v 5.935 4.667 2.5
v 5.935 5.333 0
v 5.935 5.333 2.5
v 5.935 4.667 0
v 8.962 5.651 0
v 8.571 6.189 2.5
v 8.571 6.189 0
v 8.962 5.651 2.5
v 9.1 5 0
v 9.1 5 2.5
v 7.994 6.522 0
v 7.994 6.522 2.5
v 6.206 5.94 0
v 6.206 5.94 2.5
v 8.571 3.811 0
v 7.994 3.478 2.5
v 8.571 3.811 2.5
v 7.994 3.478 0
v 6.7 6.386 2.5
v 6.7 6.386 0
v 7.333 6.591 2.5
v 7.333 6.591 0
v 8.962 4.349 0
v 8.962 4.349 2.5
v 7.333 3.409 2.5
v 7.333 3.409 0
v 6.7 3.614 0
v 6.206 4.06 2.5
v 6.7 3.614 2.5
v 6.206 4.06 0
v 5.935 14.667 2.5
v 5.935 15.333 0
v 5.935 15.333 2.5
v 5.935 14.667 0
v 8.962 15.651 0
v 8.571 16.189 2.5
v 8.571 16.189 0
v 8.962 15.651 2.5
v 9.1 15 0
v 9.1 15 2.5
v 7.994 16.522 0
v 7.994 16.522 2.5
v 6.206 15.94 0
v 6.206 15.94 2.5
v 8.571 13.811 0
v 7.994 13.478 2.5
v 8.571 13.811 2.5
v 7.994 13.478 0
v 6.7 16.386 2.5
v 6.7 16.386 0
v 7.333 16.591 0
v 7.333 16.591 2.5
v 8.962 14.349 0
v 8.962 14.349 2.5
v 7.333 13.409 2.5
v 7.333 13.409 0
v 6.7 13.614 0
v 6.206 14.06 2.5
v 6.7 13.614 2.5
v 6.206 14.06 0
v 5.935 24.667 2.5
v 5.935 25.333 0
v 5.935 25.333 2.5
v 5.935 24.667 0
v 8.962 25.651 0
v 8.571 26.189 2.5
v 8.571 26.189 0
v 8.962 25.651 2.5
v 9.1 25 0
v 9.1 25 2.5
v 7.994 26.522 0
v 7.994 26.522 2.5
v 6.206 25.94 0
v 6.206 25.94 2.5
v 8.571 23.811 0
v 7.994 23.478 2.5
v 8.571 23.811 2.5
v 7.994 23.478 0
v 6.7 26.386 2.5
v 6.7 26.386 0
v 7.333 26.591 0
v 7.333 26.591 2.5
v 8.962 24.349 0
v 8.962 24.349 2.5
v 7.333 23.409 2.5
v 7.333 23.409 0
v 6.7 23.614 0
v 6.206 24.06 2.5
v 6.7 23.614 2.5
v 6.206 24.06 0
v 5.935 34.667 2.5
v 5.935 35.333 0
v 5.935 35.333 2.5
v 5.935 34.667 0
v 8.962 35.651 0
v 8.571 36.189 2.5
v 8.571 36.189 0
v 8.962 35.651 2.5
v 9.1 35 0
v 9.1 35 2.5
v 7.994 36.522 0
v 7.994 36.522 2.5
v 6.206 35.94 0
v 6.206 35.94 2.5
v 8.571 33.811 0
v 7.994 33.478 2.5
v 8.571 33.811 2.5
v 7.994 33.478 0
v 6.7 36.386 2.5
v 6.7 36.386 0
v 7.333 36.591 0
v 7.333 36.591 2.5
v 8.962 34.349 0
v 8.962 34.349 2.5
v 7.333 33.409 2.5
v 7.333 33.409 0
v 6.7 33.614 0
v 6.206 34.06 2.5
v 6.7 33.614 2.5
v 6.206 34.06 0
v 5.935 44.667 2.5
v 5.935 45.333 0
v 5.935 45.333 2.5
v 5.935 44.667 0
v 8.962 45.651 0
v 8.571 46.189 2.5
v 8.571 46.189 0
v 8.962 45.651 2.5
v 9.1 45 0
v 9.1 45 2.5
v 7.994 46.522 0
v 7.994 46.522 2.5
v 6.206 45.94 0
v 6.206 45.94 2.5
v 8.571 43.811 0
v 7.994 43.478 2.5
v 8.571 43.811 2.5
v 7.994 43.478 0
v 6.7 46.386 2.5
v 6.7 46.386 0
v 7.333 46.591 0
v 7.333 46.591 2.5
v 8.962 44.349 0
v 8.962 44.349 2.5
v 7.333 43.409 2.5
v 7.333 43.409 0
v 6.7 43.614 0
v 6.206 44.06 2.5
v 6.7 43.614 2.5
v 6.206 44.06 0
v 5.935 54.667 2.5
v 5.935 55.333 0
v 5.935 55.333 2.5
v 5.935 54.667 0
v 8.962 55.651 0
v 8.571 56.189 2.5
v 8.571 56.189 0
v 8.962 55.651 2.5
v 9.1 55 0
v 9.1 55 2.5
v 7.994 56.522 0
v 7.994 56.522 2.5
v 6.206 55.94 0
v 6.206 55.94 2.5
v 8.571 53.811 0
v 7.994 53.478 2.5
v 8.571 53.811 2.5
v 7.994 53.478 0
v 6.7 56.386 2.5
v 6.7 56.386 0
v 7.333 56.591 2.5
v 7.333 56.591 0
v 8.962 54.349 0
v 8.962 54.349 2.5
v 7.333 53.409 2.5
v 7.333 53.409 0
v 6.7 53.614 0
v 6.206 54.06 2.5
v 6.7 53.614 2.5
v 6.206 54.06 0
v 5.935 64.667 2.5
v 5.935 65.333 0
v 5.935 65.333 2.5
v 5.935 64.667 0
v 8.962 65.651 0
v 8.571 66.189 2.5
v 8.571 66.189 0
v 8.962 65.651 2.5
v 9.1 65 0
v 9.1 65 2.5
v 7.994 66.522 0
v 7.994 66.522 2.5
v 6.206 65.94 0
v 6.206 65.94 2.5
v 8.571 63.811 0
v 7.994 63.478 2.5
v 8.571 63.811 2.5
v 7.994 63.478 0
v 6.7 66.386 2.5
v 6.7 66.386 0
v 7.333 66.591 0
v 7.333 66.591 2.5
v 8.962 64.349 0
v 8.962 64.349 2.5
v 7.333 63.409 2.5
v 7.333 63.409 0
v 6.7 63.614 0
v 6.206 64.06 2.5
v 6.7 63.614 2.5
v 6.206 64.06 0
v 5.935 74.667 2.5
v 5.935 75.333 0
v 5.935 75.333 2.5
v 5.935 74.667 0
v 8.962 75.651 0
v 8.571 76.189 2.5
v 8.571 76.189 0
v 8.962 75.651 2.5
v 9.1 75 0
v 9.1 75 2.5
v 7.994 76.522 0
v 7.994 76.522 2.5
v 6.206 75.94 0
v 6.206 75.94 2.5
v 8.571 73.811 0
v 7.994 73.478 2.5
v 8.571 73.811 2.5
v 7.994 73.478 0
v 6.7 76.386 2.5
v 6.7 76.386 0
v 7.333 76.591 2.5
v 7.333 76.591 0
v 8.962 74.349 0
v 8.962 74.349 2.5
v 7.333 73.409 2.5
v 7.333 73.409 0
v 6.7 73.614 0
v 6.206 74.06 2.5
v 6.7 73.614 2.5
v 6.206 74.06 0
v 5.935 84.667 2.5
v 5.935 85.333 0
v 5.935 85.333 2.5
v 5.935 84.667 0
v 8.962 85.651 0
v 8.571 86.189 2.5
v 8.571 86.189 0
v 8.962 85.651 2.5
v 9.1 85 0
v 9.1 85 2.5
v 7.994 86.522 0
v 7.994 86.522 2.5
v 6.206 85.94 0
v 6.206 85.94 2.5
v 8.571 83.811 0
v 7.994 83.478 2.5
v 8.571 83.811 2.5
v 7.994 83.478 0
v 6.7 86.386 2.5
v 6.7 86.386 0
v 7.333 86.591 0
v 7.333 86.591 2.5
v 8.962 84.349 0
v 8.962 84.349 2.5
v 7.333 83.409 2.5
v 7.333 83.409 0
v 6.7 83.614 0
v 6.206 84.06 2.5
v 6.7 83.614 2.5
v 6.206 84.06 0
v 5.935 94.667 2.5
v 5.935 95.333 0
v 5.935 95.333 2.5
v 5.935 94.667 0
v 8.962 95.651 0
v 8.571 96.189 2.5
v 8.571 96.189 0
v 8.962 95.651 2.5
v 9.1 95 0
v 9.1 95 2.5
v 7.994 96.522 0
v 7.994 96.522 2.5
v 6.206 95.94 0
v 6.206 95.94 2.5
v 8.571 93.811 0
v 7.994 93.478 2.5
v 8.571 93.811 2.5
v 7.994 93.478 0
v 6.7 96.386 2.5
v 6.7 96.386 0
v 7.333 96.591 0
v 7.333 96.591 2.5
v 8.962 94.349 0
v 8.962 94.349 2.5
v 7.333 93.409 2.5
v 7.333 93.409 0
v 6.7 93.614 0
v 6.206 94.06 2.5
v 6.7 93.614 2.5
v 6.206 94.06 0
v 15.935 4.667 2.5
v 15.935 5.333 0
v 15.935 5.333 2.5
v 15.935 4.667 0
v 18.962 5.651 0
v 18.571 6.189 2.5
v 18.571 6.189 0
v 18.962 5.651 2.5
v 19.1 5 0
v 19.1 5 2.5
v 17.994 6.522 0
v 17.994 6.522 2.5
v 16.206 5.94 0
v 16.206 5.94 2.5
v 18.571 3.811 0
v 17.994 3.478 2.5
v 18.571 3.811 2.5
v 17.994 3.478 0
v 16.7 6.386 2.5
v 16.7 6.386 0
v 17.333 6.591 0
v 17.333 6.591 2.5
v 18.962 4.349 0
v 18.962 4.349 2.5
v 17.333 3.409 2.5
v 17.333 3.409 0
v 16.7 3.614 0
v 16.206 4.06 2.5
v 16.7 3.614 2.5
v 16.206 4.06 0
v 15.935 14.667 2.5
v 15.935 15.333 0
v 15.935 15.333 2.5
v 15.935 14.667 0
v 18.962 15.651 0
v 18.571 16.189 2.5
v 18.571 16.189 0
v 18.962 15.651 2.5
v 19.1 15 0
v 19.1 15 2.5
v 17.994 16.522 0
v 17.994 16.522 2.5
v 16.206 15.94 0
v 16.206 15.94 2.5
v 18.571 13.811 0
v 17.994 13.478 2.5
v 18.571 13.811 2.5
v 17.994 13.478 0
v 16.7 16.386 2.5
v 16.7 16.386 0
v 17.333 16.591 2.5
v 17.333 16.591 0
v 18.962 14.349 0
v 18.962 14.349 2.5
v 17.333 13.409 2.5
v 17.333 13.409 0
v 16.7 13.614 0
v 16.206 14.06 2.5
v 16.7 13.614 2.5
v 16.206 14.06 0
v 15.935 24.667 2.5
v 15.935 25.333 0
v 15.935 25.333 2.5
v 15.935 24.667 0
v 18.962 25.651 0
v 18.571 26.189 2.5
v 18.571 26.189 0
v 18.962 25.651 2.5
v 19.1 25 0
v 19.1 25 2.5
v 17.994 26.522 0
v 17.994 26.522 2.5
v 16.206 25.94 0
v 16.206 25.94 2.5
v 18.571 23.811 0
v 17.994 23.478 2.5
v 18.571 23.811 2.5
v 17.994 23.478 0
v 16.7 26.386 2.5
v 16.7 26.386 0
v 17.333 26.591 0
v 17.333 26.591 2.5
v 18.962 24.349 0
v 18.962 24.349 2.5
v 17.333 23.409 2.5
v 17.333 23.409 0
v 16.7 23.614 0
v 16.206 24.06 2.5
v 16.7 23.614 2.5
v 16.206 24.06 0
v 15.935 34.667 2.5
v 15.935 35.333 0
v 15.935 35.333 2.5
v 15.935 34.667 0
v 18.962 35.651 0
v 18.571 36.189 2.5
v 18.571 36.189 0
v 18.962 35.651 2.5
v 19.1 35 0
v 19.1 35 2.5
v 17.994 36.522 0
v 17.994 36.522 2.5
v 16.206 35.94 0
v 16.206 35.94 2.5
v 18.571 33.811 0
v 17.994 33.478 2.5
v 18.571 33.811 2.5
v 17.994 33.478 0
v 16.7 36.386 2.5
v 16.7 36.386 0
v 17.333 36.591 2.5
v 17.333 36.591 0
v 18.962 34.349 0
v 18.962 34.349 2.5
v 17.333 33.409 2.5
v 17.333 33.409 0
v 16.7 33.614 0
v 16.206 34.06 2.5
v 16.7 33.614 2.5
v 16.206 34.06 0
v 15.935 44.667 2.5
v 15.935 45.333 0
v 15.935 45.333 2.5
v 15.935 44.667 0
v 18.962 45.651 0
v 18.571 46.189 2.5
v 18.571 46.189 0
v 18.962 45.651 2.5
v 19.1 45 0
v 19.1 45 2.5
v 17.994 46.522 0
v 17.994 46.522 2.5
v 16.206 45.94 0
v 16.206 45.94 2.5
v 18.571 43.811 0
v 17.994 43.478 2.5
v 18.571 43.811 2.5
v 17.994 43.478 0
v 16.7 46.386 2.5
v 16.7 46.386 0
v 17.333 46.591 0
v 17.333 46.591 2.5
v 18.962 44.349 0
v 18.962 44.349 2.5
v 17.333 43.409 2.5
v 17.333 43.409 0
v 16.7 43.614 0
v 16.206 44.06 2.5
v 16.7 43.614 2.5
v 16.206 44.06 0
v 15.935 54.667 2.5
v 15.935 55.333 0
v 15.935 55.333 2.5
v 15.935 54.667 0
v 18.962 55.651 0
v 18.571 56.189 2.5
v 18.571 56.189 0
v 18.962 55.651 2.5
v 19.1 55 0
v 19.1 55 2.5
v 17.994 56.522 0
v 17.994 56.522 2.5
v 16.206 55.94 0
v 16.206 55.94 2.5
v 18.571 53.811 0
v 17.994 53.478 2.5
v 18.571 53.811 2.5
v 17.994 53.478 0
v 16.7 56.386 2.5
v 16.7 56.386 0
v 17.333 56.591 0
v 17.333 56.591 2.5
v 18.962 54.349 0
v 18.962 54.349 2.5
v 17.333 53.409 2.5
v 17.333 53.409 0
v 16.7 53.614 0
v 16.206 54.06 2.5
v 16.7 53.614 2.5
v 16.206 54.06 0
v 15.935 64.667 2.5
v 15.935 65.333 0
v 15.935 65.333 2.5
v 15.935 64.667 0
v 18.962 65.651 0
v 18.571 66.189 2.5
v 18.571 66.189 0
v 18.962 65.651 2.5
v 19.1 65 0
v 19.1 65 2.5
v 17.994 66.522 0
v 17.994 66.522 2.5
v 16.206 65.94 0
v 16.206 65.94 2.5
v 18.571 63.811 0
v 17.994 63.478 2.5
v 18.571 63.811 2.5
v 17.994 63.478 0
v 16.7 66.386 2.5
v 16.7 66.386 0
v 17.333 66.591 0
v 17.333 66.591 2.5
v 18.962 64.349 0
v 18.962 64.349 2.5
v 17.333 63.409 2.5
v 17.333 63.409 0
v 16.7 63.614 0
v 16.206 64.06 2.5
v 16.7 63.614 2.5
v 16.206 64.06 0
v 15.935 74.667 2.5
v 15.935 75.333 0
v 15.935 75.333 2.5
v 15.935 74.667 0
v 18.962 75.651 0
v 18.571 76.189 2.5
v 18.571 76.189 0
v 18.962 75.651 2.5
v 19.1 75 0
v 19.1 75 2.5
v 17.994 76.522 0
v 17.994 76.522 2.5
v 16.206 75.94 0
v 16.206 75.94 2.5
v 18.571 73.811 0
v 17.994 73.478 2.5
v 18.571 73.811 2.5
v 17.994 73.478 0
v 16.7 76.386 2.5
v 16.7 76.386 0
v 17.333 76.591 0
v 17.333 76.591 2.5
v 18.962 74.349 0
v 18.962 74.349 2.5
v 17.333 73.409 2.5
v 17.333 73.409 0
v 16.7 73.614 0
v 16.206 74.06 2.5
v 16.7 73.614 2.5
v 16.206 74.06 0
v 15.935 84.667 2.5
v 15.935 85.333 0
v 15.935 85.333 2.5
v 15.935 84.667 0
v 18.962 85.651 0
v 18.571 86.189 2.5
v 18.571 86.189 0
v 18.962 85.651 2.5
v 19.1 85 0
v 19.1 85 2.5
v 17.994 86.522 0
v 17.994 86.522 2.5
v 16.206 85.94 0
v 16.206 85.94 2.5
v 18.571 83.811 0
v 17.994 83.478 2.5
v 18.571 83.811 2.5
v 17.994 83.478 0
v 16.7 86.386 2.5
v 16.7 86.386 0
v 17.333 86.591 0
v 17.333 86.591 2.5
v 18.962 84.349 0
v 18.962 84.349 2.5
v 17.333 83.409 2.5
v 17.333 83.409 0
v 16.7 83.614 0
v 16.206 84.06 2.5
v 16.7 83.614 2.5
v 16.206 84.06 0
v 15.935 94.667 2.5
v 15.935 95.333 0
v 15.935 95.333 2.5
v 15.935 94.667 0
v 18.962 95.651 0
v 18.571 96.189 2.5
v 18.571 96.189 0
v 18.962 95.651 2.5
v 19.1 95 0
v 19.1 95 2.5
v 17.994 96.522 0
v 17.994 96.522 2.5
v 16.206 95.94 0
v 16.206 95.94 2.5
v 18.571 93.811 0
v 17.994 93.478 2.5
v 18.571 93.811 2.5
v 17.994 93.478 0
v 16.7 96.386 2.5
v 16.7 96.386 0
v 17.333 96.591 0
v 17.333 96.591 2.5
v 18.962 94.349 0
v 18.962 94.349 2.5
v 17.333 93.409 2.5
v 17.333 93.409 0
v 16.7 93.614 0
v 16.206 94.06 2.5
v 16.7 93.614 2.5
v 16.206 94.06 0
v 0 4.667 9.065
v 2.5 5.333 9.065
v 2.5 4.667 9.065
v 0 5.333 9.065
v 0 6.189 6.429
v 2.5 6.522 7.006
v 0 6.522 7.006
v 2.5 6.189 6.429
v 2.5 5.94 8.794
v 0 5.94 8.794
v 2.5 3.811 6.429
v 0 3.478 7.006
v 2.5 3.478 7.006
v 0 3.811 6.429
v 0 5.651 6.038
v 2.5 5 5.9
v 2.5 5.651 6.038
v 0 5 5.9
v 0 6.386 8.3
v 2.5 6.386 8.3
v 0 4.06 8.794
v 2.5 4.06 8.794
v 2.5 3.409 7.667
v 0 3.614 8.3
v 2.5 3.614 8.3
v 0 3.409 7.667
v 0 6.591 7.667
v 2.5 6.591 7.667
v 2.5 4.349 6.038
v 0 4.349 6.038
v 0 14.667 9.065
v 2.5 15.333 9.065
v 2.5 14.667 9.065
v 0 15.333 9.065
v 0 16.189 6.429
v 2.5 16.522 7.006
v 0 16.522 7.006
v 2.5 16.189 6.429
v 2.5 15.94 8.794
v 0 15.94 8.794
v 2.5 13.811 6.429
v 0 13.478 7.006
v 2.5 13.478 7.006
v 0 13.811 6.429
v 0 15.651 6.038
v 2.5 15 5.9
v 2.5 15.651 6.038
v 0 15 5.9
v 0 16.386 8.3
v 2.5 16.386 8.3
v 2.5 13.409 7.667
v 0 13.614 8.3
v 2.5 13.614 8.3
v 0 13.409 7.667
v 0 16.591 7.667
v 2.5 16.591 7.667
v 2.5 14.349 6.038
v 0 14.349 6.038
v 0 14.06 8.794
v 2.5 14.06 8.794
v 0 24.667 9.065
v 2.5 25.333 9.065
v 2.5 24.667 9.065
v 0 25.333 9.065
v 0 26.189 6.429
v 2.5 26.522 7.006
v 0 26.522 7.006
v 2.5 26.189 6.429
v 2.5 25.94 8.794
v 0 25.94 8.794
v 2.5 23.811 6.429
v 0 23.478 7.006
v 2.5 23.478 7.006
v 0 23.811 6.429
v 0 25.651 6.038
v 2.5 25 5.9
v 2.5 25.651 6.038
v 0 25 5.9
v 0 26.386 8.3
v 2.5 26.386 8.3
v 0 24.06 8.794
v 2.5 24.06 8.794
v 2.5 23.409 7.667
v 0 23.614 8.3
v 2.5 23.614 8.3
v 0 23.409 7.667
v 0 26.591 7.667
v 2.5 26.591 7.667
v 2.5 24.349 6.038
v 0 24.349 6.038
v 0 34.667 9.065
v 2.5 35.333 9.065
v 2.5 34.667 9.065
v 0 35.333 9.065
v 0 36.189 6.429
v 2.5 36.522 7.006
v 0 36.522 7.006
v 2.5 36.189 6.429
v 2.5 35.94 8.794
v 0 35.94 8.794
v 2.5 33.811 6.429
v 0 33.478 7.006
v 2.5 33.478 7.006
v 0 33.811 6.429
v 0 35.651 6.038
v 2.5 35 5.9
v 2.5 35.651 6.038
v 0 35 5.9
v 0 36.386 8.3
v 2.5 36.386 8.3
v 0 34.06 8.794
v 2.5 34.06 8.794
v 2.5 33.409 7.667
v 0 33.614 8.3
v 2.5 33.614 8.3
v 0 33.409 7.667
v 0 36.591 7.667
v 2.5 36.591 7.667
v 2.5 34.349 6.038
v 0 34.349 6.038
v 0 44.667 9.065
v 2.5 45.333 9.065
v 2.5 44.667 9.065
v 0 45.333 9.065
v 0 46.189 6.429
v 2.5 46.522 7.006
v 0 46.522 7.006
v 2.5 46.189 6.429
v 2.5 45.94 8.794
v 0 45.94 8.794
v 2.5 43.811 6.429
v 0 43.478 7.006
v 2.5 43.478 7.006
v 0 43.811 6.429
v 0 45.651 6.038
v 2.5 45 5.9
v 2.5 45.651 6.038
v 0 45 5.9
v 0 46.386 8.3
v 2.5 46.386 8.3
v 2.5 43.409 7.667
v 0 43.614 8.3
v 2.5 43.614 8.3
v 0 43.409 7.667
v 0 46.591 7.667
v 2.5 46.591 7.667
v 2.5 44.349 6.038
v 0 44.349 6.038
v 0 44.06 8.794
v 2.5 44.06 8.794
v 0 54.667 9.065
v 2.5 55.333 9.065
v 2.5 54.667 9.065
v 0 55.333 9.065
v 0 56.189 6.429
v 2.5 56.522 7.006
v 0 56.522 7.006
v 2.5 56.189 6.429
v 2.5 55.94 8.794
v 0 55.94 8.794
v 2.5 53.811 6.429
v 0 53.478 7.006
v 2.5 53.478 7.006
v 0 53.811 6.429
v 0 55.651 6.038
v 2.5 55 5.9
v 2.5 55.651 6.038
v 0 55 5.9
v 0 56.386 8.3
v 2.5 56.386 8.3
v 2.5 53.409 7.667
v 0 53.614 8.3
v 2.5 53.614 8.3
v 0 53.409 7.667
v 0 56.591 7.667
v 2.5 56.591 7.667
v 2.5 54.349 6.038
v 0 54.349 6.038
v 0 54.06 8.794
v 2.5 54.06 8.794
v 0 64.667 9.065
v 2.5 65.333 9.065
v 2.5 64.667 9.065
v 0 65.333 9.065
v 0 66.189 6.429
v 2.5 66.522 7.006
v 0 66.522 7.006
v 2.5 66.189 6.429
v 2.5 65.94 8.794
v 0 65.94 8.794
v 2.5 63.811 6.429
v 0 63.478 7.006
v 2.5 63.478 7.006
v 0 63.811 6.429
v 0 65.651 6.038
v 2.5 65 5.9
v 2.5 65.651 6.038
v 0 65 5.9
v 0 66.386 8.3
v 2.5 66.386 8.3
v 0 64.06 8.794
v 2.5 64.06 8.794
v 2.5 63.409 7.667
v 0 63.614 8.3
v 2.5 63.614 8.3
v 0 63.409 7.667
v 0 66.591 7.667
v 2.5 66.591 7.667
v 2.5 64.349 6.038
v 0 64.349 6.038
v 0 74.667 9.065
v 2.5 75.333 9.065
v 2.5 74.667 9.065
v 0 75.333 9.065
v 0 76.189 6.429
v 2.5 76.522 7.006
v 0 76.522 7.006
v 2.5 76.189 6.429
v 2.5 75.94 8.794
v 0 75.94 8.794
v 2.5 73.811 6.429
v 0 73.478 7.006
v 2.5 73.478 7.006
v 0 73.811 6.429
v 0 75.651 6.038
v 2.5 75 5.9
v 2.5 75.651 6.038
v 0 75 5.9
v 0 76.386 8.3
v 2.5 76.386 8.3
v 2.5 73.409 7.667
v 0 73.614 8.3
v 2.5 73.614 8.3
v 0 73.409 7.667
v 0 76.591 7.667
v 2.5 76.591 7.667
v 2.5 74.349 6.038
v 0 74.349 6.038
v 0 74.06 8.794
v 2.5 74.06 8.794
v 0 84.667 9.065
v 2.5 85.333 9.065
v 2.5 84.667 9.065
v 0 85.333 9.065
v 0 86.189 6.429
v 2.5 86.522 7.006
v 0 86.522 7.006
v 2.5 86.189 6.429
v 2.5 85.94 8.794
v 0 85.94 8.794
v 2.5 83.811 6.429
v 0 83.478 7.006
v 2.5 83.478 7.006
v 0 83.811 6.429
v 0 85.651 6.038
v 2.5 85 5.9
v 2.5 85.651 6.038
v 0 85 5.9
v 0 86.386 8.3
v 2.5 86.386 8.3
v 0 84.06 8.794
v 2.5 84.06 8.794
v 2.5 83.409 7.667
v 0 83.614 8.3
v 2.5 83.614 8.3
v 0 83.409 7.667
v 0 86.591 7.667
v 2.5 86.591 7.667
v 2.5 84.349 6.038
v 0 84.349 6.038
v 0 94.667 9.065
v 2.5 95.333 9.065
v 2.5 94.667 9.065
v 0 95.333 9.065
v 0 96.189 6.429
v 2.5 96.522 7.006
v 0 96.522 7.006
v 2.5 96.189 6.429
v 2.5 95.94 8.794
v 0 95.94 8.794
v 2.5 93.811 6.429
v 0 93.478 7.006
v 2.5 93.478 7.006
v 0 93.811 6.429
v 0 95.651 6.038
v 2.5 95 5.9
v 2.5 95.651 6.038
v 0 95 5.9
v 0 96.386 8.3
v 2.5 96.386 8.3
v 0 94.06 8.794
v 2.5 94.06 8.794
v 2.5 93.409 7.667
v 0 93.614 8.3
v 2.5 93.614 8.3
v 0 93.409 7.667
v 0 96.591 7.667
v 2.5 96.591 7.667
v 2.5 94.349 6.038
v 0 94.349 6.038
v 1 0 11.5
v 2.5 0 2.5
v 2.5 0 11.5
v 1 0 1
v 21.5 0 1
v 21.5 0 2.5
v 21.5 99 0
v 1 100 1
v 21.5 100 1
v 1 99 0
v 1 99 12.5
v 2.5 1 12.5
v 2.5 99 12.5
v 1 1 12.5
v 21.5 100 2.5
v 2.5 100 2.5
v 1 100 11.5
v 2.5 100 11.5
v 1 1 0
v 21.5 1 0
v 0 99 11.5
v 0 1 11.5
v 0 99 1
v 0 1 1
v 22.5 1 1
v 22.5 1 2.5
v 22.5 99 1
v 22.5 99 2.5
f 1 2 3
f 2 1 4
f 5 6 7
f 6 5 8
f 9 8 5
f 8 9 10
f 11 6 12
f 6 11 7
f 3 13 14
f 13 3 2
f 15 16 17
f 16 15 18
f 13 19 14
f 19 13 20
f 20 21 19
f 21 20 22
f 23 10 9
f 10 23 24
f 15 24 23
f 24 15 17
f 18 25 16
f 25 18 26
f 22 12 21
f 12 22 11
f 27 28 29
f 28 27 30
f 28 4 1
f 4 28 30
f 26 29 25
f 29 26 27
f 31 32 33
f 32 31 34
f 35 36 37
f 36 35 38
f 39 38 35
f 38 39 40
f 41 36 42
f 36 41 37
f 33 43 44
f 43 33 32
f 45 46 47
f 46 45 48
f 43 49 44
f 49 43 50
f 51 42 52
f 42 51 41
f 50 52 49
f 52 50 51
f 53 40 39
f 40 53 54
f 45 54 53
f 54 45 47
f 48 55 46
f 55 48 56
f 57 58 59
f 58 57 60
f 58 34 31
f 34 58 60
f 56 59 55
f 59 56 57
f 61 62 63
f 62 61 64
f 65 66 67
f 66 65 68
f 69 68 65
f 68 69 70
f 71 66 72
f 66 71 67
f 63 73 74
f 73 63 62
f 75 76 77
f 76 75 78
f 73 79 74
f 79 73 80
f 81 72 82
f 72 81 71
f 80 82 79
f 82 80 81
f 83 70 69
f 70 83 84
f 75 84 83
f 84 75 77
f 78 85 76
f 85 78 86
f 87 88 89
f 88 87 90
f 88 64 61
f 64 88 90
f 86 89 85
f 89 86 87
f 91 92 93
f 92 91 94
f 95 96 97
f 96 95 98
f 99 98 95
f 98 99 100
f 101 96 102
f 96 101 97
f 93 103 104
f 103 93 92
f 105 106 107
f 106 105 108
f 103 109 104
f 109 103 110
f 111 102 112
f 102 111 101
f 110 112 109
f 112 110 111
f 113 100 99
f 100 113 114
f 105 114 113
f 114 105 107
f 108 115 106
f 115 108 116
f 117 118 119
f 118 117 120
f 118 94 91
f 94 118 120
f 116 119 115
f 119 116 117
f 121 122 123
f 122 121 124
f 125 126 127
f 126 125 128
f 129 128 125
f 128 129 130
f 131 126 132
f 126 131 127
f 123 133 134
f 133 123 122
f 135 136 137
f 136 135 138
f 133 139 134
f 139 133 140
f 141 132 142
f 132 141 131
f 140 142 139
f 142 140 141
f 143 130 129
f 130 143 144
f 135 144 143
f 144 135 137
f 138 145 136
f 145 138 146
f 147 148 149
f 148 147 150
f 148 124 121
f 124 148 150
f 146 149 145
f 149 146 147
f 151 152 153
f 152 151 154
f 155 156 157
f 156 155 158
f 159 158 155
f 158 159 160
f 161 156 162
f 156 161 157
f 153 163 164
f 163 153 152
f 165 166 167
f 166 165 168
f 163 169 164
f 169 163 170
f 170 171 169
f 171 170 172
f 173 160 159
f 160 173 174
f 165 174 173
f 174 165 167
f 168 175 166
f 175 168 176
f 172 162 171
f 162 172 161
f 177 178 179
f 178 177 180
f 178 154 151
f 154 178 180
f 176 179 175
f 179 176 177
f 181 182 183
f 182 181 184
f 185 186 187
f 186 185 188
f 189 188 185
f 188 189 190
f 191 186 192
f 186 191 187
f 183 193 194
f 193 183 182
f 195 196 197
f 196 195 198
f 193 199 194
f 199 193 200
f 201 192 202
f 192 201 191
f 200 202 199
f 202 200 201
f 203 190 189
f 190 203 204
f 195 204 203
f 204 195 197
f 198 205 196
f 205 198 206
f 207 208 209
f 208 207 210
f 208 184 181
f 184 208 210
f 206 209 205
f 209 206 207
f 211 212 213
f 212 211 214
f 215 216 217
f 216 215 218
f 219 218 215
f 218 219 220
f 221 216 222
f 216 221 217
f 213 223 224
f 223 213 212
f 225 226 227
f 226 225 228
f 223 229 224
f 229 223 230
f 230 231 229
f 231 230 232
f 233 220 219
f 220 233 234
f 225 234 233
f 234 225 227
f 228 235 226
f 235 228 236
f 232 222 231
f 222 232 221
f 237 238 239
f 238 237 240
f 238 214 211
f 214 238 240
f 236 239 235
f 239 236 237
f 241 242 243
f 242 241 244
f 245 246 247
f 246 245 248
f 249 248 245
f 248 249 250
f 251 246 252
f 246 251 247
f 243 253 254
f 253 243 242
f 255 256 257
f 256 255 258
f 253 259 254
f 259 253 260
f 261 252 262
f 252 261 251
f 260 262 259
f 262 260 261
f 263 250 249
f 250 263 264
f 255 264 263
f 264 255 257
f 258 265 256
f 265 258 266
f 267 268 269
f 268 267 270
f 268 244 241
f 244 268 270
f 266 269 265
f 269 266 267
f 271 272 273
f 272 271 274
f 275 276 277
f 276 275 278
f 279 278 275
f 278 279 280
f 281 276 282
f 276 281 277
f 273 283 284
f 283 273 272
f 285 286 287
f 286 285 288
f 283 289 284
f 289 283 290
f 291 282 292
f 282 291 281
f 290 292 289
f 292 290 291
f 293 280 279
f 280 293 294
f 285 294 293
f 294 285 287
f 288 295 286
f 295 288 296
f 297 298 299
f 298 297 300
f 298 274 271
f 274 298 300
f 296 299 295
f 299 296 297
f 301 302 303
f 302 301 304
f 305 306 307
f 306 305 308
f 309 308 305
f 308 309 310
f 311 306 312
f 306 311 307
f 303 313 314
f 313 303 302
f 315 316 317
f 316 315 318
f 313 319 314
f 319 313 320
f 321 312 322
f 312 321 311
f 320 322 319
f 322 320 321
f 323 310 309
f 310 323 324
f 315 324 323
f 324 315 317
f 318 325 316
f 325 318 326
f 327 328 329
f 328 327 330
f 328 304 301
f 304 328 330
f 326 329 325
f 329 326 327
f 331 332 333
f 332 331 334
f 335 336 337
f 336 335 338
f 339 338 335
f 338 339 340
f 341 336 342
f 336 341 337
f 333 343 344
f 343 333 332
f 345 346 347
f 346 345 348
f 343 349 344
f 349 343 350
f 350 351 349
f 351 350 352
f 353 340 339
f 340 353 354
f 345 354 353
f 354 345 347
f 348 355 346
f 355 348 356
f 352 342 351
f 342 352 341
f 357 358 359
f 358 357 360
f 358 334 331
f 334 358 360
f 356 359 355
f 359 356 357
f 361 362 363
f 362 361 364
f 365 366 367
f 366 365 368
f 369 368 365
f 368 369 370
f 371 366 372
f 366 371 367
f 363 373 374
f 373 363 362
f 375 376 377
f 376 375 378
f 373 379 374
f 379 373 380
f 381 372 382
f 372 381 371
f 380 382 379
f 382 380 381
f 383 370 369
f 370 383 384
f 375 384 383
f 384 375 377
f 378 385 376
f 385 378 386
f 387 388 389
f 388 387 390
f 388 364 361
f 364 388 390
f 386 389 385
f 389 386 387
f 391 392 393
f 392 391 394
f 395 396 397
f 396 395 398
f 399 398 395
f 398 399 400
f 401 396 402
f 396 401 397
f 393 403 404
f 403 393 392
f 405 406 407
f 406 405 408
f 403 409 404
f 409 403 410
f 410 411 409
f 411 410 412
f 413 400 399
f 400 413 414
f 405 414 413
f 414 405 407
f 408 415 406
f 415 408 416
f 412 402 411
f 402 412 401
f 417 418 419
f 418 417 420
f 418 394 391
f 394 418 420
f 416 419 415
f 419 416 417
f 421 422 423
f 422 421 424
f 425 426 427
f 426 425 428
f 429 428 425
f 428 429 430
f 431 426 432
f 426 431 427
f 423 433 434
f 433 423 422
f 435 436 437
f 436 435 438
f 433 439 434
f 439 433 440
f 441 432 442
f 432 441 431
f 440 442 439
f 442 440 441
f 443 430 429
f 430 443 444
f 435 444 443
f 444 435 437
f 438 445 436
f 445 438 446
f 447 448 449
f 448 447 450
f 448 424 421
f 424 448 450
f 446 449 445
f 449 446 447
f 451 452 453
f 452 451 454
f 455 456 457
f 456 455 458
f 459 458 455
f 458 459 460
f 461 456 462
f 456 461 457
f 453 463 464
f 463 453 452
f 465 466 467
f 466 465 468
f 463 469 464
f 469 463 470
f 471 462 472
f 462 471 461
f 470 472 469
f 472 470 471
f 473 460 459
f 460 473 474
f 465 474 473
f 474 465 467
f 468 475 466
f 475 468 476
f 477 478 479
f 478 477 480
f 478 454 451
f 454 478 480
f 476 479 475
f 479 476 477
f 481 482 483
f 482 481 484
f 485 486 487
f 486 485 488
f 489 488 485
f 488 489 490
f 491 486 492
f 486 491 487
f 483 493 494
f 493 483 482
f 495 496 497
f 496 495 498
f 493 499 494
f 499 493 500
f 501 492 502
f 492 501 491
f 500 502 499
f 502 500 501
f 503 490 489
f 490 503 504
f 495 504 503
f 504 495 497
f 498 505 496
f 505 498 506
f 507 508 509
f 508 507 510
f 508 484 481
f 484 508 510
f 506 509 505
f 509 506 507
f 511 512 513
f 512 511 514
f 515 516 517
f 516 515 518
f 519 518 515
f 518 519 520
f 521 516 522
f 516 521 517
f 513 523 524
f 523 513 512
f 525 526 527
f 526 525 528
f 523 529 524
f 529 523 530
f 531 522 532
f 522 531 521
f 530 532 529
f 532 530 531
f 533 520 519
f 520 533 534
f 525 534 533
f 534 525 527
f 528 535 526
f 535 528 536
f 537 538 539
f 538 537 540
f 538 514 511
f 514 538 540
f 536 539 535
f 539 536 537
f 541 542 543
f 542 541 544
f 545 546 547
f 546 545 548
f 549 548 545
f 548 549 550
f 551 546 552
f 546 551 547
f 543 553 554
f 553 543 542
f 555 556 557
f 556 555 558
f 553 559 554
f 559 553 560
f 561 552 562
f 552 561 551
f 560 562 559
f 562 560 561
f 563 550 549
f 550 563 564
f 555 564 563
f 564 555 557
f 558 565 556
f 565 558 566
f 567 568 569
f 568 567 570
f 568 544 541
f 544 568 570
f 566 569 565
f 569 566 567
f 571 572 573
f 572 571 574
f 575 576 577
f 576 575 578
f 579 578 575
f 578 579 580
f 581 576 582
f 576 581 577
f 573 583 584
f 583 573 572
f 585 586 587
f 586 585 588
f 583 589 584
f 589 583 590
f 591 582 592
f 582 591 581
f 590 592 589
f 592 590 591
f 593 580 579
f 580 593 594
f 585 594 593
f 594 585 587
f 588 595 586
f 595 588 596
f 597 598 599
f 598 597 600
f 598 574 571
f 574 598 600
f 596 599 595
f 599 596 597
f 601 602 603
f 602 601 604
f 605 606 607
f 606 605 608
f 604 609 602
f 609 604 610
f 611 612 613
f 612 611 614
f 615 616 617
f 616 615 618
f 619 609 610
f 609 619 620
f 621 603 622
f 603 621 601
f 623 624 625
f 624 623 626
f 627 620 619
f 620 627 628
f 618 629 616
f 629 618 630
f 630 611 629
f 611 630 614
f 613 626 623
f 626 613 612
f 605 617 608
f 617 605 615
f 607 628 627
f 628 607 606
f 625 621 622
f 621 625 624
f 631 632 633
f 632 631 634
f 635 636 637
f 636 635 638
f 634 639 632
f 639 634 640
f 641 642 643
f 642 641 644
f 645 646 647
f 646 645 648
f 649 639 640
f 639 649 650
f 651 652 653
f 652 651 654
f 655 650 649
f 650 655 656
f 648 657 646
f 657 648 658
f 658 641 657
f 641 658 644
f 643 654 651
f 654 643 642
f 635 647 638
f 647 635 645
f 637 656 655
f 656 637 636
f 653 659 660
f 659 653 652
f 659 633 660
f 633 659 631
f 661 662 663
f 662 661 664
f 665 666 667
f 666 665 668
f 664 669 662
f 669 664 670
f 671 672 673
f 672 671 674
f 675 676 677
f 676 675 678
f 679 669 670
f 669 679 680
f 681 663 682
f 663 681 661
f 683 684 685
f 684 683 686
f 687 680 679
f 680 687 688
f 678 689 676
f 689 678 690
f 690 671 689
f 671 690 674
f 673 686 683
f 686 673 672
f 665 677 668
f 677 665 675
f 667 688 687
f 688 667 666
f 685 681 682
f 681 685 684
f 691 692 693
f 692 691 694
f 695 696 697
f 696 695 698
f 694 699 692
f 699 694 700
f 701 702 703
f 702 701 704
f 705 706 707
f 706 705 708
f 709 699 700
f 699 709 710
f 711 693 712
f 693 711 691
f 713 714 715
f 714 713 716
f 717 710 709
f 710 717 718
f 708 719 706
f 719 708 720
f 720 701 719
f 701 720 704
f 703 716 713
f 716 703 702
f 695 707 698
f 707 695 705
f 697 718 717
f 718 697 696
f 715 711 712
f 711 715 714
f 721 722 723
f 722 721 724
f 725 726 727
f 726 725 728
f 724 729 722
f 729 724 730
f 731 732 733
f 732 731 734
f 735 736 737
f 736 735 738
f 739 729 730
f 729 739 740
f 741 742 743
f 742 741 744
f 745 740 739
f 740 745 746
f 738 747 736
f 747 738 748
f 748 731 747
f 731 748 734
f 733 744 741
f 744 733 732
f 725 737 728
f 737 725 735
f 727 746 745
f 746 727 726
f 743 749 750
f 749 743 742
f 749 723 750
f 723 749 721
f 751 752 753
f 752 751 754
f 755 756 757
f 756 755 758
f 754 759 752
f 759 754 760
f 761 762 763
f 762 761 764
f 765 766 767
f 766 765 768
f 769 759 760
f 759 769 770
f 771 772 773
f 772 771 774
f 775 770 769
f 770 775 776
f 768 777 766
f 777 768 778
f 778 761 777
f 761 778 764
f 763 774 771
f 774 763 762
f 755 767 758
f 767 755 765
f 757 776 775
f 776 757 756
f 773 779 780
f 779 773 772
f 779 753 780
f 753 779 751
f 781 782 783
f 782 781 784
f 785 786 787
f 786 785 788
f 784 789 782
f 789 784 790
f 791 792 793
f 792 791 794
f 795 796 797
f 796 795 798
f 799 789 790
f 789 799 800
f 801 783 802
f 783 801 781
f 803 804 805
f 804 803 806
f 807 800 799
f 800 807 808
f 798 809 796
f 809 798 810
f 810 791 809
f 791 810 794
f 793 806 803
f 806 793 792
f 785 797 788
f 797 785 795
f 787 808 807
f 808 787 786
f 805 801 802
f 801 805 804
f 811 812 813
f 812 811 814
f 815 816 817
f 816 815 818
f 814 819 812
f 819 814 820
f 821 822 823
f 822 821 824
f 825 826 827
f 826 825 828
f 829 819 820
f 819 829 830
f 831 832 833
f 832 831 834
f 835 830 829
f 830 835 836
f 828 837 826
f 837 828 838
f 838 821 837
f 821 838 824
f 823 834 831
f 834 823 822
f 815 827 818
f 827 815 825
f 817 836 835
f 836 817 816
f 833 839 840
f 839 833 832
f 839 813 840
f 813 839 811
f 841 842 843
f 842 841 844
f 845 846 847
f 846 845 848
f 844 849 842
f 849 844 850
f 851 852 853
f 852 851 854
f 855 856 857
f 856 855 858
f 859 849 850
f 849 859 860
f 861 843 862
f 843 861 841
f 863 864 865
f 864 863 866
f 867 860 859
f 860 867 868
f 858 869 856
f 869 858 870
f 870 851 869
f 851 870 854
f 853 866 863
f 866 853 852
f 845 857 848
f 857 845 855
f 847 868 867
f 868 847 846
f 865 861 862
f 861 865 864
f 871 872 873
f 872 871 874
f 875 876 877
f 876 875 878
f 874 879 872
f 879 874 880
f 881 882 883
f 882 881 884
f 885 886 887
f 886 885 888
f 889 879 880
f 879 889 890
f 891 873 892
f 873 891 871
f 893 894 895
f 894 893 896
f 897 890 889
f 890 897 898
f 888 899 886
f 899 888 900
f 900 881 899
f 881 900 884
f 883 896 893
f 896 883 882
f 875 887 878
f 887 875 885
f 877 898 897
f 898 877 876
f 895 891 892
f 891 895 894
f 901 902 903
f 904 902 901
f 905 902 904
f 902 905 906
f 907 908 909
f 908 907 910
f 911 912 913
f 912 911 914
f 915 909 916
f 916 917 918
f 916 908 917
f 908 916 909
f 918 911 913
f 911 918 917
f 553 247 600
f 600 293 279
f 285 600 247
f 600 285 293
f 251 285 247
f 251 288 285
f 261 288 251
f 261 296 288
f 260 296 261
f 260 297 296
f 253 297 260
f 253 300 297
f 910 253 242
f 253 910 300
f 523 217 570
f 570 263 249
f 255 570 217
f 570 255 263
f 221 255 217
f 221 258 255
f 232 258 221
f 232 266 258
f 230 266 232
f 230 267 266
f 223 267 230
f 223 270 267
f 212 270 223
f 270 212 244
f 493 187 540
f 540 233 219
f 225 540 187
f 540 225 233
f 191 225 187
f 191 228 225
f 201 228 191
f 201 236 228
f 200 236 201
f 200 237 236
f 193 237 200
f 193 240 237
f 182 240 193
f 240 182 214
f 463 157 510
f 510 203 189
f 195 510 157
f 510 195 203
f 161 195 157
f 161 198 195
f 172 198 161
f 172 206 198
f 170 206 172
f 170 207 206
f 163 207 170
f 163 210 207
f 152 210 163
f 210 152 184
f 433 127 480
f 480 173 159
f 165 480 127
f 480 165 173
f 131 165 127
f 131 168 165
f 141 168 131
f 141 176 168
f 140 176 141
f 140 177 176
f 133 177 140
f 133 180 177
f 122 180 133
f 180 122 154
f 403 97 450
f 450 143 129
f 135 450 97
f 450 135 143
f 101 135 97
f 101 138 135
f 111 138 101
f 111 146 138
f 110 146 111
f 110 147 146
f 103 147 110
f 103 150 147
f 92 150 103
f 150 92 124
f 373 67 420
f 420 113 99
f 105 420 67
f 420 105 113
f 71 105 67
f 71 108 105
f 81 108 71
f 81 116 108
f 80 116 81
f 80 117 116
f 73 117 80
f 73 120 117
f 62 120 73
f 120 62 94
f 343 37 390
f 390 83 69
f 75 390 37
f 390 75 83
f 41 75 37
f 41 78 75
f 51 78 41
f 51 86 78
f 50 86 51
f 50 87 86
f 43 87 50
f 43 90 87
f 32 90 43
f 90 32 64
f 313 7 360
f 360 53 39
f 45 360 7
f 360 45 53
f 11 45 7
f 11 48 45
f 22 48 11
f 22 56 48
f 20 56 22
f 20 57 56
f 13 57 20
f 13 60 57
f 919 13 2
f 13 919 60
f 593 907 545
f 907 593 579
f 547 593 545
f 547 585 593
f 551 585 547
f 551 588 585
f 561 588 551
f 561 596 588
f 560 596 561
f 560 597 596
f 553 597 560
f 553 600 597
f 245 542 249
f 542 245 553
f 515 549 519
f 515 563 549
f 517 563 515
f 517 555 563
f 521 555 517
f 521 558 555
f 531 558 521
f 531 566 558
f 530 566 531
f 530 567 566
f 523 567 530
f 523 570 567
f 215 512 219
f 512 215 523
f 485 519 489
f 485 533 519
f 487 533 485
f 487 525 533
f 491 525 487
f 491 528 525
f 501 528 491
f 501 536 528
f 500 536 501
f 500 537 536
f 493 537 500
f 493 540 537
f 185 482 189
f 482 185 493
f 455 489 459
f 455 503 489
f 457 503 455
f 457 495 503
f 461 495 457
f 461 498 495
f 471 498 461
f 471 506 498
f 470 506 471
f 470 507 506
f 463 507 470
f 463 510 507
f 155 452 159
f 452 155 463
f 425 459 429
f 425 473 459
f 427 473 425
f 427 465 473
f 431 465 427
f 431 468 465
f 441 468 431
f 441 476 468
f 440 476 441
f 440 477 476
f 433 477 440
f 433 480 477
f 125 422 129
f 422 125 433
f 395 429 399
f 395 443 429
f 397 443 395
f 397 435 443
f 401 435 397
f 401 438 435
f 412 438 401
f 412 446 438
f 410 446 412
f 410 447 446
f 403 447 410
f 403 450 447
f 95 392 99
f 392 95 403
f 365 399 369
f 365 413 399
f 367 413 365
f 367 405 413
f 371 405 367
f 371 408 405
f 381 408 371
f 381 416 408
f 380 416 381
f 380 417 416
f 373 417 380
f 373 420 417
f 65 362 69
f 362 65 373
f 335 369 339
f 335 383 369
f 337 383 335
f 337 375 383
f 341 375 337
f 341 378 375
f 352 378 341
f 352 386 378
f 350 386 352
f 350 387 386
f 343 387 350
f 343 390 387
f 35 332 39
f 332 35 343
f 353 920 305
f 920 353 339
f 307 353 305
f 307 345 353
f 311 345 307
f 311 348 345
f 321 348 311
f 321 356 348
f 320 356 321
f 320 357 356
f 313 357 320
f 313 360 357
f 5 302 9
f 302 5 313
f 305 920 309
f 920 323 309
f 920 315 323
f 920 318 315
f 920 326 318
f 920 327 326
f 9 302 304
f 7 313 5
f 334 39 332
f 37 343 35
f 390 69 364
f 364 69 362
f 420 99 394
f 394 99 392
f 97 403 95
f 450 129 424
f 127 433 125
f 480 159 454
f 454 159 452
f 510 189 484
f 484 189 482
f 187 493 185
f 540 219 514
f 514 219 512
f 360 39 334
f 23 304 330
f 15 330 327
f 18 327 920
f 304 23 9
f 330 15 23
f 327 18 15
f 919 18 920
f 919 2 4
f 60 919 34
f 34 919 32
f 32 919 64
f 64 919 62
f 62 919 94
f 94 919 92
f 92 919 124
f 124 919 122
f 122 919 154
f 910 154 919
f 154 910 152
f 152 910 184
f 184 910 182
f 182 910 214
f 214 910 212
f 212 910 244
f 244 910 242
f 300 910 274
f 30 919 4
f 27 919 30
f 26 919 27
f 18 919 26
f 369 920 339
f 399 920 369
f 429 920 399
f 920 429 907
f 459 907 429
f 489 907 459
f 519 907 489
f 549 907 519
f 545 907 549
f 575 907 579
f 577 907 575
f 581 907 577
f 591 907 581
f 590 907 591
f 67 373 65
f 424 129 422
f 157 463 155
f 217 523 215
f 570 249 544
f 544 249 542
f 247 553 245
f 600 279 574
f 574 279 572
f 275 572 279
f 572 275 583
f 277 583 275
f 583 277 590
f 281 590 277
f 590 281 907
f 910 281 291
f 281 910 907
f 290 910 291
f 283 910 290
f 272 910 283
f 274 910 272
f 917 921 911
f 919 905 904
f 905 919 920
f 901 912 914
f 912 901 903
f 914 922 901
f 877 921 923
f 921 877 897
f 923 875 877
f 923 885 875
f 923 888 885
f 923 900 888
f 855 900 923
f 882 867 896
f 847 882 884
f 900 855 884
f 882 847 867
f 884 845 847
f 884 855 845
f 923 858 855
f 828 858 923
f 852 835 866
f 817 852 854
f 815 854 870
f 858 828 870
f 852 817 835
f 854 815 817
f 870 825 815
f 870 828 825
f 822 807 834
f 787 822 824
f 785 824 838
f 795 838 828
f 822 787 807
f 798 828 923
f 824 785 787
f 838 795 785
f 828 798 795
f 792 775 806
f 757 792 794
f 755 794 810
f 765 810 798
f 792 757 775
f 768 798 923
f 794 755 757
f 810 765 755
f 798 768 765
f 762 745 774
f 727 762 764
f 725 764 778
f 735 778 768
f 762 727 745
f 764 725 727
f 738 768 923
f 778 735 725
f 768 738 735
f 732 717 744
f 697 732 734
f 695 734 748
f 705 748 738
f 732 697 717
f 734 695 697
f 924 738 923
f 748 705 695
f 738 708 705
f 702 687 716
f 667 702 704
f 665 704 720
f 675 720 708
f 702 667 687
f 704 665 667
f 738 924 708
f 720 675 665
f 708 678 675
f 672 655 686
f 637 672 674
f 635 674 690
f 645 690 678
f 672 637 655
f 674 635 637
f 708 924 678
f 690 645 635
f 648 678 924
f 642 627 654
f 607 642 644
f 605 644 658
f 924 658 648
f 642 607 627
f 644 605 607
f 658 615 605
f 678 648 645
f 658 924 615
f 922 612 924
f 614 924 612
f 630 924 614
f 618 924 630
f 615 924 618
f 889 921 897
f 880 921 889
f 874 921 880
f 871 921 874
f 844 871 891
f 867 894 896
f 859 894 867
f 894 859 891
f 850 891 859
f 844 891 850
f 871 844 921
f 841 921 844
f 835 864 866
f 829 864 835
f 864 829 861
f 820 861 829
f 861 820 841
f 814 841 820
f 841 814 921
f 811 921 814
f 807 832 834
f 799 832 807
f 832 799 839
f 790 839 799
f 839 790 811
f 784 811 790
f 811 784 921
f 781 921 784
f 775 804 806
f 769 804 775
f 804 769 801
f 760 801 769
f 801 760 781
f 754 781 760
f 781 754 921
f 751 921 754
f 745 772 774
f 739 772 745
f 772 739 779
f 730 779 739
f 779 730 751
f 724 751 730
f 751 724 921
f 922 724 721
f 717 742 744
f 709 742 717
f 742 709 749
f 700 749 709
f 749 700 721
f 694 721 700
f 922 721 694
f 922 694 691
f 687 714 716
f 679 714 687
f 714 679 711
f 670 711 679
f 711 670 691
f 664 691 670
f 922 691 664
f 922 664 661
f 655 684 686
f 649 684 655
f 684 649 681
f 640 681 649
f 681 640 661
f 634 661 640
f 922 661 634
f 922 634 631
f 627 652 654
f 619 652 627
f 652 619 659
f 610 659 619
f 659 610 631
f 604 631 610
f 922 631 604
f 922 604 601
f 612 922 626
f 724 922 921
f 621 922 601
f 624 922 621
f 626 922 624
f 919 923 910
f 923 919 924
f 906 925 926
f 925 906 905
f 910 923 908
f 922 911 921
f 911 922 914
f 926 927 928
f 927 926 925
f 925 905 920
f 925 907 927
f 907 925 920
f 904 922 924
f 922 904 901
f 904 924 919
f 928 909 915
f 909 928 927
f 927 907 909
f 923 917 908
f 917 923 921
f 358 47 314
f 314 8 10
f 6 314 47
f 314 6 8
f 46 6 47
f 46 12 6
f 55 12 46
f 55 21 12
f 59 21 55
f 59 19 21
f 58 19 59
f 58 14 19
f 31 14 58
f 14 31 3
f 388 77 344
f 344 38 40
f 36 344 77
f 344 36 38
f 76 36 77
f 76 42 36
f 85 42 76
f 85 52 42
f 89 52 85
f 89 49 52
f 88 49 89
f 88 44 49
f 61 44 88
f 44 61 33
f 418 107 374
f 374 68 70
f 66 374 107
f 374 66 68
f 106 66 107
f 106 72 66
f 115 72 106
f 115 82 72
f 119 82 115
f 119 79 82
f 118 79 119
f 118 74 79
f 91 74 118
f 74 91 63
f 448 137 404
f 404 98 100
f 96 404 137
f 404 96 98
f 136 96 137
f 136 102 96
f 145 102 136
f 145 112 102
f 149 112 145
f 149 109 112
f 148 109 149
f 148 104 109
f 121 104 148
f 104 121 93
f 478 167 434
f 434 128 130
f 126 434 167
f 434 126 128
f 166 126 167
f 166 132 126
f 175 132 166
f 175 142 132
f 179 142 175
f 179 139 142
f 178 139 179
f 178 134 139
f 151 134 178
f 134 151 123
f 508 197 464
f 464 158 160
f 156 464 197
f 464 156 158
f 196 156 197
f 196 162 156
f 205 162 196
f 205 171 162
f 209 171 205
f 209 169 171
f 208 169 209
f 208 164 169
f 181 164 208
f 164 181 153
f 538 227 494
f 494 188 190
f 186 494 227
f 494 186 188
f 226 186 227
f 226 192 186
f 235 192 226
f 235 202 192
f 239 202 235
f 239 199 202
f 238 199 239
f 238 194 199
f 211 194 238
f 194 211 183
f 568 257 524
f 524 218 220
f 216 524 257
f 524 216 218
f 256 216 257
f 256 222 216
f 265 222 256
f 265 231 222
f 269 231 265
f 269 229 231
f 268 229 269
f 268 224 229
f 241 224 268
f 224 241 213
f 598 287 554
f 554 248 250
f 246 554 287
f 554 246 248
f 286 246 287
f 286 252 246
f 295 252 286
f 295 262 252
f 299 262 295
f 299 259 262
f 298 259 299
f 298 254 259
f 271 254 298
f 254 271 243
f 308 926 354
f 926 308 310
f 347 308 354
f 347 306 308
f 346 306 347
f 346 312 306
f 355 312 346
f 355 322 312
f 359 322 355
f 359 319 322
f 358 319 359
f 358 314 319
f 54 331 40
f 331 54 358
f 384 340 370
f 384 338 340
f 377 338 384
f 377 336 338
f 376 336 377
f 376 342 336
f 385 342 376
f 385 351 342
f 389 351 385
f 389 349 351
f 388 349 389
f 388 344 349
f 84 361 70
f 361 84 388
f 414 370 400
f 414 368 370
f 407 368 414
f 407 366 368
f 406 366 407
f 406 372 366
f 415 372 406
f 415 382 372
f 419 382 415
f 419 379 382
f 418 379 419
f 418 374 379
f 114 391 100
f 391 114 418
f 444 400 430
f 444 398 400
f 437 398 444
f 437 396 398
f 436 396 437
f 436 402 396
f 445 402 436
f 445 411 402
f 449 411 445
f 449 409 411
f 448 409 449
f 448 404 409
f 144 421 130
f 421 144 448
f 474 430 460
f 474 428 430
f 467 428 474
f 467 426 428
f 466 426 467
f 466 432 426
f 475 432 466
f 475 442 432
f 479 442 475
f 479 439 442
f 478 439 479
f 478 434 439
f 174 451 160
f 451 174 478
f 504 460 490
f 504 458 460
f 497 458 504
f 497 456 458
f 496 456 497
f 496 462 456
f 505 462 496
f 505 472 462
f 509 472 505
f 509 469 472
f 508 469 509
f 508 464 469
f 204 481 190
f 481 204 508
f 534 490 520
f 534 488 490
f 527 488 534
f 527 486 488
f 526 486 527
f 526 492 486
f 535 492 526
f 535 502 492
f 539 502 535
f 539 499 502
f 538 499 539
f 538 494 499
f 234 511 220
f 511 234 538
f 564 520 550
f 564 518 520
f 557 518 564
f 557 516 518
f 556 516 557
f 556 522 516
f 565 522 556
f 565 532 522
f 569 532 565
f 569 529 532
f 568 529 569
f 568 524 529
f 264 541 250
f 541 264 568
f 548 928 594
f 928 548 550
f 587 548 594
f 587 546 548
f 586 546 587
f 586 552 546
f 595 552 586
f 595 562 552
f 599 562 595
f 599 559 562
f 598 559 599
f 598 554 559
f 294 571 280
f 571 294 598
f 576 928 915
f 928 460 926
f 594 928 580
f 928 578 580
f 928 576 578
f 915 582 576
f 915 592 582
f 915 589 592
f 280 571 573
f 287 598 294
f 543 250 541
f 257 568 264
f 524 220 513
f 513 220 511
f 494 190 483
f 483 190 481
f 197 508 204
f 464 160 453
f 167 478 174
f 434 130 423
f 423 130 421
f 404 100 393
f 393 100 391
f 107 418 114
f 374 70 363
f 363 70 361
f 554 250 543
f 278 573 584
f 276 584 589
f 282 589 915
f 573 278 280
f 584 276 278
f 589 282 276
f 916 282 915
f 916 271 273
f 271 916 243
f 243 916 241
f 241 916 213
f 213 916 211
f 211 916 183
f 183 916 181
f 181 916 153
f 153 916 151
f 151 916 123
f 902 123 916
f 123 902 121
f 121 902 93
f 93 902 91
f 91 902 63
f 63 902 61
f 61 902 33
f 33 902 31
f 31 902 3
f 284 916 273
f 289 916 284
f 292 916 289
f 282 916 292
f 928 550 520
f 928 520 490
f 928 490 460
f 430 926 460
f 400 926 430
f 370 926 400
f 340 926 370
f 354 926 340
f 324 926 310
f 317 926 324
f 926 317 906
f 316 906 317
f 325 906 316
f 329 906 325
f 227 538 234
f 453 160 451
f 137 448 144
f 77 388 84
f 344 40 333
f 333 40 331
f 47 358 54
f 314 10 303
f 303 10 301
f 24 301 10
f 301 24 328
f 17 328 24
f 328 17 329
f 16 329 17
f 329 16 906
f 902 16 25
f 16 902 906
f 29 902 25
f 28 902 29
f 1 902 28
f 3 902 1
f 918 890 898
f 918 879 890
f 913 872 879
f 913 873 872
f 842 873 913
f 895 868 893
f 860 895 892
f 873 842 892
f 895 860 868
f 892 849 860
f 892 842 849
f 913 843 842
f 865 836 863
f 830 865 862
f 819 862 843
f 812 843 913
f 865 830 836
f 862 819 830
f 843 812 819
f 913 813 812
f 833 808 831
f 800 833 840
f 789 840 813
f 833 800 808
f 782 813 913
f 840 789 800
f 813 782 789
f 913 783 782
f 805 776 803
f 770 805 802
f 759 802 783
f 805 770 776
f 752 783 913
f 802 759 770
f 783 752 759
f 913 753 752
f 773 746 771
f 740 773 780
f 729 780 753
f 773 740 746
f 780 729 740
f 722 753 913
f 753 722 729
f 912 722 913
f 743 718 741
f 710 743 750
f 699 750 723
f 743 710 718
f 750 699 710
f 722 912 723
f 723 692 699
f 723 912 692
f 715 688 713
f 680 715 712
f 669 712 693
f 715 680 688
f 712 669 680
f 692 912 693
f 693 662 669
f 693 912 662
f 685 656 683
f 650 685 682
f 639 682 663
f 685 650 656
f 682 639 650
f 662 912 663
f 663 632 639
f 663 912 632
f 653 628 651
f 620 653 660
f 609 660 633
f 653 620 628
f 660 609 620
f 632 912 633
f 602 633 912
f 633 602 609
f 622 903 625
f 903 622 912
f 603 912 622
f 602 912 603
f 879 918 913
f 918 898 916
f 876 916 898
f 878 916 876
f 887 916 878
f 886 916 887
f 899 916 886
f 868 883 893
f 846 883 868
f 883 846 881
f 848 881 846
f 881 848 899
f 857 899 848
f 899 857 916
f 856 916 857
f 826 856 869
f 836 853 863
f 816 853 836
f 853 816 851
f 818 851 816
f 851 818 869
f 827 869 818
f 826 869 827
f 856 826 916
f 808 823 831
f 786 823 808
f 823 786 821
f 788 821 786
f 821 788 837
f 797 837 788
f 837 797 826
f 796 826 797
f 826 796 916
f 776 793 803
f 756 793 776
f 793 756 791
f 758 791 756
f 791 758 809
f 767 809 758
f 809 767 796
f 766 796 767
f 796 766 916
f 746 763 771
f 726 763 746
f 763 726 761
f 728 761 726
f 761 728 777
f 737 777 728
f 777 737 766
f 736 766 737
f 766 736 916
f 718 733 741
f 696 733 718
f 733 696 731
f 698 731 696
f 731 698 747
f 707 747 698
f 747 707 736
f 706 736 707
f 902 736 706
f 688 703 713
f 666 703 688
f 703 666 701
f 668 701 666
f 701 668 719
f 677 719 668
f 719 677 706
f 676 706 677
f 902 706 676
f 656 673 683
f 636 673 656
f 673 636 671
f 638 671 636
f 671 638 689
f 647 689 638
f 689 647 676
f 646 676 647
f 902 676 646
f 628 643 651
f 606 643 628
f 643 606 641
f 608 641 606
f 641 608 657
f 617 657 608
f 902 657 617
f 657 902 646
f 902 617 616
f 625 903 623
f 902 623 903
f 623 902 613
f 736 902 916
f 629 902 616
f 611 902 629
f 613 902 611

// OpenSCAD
/*  
        Vee.scad
        M3Z core library 1.0.0
*/

//BEGIN OPTIONS - edit these parameters to generate custom parts of this form.

N = 2; //whole number of 10mm units along the X axis
M = 10; //whole number of 10mm units along the Y axis
H = 1; //whole number of 10mm units along the Z axis.

THICKNESS = 2.5; //Nominal 2.5mm - thickness of the walls of the part

CHAMFER_DEPTH = 1.0; //Default 1.0mm

HOLE_DIAMETER = 3.2; //Nominal 3.0mm - common diameter of holes throughout

HOLE_FACES = 15; //Default 20 - higher number => slower render, smoother holes

//END OPTIONS - edit all else at your own risk

//Modules

module chamferCube(dimensions,depth){
    //where dimensions is a vector e.g. [10,20,30] and depth is the depth of the chamfer.
    
    f=2*depth;
    
    octaPoints = [ 
                    [1,0,0],
                    [0,1,0],
                    [-1,0,0],
                    [0,-1,0],
                    [0,0,1],
                    [0,0,-1]
                ];

    octaFaces = [   
                    [0,4,1],
                    [1,4,2],
                    [2,4,3],
                    [3,4,0],
                    [0,1,5],
                    [1,2,5],
                    [2,3,5],
                    [3,0,5] 
                ];
    translate([depth,depth,depth])
    minkowski(){
        cube([dimensions[0]-f,dimensions[1]-f,dimensions[2]-f]);
        polyhedron(octaPoints*depth, octaFaces);
    }
}

//variables (derived and not to be edited)

bodyWidth = N * 10 + THICKNESS;
bodyLength = M * 10;
bodyHeight = H * 10 + THICKNESS;
bodyDims = [bodyWidth,bodyLength,bodyHeight];

//Part Generating Code

difference(){
    chamferCube(bodyDims,1);
    translate([THICKNESS,-10,THICKNESS]){
        cube([N*11,M*12,H*11]);
    }
    
    for(i = [0:N-1]){
        for(j = [0:M-1]){
            translate([THICKNESS+5+10*i,5+10*j,0]){
                cylinder(h= bodyHeight*3, d = HOLE_DIAMETER, center = true, $fn = HOLE_FACES);
            }
        }
    }
    
    for(j = [0:M-1]){
        for(k = [0:H-1]){
            translate([0,5+10*j,THICKNESS+5+10*k]){
                rotate(90,[0,1,0]){
                    cylinder(h=bodyWidth*3, d=HOLE_DIAMETER, center = true, $fn = HOLE_FACES);
                }
            }
        }
    }
}
